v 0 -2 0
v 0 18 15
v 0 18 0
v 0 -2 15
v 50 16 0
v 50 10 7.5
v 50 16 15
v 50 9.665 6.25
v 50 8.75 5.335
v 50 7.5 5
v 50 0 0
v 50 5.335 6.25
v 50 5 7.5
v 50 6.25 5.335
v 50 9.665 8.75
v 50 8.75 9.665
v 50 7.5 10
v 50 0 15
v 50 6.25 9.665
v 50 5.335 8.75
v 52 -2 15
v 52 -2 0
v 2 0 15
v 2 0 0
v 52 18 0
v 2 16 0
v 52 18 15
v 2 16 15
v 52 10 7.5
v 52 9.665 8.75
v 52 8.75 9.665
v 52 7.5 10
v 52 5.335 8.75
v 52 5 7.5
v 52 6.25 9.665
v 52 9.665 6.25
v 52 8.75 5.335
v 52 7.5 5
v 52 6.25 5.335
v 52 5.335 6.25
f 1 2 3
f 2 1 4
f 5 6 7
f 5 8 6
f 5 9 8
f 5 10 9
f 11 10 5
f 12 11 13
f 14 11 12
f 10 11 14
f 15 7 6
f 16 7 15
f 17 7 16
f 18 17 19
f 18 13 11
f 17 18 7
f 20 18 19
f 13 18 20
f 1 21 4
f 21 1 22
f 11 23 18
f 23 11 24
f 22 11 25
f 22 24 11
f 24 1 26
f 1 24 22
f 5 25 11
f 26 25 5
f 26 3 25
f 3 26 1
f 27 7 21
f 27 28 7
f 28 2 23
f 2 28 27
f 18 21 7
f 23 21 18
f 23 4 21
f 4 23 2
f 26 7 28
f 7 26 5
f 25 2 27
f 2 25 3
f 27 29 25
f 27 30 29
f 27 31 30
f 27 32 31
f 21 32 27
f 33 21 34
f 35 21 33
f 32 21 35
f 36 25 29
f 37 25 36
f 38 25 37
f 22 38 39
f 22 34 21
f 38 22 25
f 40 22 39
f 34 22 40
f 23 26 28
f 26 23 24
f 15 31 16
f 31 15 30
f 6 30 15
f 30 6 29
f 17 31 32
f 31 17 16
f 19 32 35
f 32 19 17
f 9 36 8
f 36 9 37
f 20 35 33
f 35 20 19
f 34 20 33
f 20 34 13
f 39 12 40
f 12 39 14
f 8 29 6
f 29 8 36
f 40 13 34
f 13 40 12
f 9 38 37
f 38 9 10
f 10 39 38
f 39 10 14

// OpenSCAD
module sensor_mount_body()
{
 union() { 
      translate([0,0,0]) rotate([90,0,0]) cube([50,15,2]); 
      translate([0,18,0]) rotate([90,0,0]) cube([50,15,2]);
      
      translate([50,-2,0]) rotate([90,0,90]) cube([20,15,2]);
      translate([0,-2,0]) rotate([90,0,90]) cube([20,15,2]);
      
      
      }
}

module sensor_mount_cuts()
{

      translate([50,7.5,7.5]) rotate([90, 0, 90]) cylinder(r=2.5, h=5, center=true, $fn=12);

}

module sensor_mount()
{
   difference() {
    sensor_mount_body();
    sensor_mount_cuts();
    
     
     }
}

sensor_mount();
